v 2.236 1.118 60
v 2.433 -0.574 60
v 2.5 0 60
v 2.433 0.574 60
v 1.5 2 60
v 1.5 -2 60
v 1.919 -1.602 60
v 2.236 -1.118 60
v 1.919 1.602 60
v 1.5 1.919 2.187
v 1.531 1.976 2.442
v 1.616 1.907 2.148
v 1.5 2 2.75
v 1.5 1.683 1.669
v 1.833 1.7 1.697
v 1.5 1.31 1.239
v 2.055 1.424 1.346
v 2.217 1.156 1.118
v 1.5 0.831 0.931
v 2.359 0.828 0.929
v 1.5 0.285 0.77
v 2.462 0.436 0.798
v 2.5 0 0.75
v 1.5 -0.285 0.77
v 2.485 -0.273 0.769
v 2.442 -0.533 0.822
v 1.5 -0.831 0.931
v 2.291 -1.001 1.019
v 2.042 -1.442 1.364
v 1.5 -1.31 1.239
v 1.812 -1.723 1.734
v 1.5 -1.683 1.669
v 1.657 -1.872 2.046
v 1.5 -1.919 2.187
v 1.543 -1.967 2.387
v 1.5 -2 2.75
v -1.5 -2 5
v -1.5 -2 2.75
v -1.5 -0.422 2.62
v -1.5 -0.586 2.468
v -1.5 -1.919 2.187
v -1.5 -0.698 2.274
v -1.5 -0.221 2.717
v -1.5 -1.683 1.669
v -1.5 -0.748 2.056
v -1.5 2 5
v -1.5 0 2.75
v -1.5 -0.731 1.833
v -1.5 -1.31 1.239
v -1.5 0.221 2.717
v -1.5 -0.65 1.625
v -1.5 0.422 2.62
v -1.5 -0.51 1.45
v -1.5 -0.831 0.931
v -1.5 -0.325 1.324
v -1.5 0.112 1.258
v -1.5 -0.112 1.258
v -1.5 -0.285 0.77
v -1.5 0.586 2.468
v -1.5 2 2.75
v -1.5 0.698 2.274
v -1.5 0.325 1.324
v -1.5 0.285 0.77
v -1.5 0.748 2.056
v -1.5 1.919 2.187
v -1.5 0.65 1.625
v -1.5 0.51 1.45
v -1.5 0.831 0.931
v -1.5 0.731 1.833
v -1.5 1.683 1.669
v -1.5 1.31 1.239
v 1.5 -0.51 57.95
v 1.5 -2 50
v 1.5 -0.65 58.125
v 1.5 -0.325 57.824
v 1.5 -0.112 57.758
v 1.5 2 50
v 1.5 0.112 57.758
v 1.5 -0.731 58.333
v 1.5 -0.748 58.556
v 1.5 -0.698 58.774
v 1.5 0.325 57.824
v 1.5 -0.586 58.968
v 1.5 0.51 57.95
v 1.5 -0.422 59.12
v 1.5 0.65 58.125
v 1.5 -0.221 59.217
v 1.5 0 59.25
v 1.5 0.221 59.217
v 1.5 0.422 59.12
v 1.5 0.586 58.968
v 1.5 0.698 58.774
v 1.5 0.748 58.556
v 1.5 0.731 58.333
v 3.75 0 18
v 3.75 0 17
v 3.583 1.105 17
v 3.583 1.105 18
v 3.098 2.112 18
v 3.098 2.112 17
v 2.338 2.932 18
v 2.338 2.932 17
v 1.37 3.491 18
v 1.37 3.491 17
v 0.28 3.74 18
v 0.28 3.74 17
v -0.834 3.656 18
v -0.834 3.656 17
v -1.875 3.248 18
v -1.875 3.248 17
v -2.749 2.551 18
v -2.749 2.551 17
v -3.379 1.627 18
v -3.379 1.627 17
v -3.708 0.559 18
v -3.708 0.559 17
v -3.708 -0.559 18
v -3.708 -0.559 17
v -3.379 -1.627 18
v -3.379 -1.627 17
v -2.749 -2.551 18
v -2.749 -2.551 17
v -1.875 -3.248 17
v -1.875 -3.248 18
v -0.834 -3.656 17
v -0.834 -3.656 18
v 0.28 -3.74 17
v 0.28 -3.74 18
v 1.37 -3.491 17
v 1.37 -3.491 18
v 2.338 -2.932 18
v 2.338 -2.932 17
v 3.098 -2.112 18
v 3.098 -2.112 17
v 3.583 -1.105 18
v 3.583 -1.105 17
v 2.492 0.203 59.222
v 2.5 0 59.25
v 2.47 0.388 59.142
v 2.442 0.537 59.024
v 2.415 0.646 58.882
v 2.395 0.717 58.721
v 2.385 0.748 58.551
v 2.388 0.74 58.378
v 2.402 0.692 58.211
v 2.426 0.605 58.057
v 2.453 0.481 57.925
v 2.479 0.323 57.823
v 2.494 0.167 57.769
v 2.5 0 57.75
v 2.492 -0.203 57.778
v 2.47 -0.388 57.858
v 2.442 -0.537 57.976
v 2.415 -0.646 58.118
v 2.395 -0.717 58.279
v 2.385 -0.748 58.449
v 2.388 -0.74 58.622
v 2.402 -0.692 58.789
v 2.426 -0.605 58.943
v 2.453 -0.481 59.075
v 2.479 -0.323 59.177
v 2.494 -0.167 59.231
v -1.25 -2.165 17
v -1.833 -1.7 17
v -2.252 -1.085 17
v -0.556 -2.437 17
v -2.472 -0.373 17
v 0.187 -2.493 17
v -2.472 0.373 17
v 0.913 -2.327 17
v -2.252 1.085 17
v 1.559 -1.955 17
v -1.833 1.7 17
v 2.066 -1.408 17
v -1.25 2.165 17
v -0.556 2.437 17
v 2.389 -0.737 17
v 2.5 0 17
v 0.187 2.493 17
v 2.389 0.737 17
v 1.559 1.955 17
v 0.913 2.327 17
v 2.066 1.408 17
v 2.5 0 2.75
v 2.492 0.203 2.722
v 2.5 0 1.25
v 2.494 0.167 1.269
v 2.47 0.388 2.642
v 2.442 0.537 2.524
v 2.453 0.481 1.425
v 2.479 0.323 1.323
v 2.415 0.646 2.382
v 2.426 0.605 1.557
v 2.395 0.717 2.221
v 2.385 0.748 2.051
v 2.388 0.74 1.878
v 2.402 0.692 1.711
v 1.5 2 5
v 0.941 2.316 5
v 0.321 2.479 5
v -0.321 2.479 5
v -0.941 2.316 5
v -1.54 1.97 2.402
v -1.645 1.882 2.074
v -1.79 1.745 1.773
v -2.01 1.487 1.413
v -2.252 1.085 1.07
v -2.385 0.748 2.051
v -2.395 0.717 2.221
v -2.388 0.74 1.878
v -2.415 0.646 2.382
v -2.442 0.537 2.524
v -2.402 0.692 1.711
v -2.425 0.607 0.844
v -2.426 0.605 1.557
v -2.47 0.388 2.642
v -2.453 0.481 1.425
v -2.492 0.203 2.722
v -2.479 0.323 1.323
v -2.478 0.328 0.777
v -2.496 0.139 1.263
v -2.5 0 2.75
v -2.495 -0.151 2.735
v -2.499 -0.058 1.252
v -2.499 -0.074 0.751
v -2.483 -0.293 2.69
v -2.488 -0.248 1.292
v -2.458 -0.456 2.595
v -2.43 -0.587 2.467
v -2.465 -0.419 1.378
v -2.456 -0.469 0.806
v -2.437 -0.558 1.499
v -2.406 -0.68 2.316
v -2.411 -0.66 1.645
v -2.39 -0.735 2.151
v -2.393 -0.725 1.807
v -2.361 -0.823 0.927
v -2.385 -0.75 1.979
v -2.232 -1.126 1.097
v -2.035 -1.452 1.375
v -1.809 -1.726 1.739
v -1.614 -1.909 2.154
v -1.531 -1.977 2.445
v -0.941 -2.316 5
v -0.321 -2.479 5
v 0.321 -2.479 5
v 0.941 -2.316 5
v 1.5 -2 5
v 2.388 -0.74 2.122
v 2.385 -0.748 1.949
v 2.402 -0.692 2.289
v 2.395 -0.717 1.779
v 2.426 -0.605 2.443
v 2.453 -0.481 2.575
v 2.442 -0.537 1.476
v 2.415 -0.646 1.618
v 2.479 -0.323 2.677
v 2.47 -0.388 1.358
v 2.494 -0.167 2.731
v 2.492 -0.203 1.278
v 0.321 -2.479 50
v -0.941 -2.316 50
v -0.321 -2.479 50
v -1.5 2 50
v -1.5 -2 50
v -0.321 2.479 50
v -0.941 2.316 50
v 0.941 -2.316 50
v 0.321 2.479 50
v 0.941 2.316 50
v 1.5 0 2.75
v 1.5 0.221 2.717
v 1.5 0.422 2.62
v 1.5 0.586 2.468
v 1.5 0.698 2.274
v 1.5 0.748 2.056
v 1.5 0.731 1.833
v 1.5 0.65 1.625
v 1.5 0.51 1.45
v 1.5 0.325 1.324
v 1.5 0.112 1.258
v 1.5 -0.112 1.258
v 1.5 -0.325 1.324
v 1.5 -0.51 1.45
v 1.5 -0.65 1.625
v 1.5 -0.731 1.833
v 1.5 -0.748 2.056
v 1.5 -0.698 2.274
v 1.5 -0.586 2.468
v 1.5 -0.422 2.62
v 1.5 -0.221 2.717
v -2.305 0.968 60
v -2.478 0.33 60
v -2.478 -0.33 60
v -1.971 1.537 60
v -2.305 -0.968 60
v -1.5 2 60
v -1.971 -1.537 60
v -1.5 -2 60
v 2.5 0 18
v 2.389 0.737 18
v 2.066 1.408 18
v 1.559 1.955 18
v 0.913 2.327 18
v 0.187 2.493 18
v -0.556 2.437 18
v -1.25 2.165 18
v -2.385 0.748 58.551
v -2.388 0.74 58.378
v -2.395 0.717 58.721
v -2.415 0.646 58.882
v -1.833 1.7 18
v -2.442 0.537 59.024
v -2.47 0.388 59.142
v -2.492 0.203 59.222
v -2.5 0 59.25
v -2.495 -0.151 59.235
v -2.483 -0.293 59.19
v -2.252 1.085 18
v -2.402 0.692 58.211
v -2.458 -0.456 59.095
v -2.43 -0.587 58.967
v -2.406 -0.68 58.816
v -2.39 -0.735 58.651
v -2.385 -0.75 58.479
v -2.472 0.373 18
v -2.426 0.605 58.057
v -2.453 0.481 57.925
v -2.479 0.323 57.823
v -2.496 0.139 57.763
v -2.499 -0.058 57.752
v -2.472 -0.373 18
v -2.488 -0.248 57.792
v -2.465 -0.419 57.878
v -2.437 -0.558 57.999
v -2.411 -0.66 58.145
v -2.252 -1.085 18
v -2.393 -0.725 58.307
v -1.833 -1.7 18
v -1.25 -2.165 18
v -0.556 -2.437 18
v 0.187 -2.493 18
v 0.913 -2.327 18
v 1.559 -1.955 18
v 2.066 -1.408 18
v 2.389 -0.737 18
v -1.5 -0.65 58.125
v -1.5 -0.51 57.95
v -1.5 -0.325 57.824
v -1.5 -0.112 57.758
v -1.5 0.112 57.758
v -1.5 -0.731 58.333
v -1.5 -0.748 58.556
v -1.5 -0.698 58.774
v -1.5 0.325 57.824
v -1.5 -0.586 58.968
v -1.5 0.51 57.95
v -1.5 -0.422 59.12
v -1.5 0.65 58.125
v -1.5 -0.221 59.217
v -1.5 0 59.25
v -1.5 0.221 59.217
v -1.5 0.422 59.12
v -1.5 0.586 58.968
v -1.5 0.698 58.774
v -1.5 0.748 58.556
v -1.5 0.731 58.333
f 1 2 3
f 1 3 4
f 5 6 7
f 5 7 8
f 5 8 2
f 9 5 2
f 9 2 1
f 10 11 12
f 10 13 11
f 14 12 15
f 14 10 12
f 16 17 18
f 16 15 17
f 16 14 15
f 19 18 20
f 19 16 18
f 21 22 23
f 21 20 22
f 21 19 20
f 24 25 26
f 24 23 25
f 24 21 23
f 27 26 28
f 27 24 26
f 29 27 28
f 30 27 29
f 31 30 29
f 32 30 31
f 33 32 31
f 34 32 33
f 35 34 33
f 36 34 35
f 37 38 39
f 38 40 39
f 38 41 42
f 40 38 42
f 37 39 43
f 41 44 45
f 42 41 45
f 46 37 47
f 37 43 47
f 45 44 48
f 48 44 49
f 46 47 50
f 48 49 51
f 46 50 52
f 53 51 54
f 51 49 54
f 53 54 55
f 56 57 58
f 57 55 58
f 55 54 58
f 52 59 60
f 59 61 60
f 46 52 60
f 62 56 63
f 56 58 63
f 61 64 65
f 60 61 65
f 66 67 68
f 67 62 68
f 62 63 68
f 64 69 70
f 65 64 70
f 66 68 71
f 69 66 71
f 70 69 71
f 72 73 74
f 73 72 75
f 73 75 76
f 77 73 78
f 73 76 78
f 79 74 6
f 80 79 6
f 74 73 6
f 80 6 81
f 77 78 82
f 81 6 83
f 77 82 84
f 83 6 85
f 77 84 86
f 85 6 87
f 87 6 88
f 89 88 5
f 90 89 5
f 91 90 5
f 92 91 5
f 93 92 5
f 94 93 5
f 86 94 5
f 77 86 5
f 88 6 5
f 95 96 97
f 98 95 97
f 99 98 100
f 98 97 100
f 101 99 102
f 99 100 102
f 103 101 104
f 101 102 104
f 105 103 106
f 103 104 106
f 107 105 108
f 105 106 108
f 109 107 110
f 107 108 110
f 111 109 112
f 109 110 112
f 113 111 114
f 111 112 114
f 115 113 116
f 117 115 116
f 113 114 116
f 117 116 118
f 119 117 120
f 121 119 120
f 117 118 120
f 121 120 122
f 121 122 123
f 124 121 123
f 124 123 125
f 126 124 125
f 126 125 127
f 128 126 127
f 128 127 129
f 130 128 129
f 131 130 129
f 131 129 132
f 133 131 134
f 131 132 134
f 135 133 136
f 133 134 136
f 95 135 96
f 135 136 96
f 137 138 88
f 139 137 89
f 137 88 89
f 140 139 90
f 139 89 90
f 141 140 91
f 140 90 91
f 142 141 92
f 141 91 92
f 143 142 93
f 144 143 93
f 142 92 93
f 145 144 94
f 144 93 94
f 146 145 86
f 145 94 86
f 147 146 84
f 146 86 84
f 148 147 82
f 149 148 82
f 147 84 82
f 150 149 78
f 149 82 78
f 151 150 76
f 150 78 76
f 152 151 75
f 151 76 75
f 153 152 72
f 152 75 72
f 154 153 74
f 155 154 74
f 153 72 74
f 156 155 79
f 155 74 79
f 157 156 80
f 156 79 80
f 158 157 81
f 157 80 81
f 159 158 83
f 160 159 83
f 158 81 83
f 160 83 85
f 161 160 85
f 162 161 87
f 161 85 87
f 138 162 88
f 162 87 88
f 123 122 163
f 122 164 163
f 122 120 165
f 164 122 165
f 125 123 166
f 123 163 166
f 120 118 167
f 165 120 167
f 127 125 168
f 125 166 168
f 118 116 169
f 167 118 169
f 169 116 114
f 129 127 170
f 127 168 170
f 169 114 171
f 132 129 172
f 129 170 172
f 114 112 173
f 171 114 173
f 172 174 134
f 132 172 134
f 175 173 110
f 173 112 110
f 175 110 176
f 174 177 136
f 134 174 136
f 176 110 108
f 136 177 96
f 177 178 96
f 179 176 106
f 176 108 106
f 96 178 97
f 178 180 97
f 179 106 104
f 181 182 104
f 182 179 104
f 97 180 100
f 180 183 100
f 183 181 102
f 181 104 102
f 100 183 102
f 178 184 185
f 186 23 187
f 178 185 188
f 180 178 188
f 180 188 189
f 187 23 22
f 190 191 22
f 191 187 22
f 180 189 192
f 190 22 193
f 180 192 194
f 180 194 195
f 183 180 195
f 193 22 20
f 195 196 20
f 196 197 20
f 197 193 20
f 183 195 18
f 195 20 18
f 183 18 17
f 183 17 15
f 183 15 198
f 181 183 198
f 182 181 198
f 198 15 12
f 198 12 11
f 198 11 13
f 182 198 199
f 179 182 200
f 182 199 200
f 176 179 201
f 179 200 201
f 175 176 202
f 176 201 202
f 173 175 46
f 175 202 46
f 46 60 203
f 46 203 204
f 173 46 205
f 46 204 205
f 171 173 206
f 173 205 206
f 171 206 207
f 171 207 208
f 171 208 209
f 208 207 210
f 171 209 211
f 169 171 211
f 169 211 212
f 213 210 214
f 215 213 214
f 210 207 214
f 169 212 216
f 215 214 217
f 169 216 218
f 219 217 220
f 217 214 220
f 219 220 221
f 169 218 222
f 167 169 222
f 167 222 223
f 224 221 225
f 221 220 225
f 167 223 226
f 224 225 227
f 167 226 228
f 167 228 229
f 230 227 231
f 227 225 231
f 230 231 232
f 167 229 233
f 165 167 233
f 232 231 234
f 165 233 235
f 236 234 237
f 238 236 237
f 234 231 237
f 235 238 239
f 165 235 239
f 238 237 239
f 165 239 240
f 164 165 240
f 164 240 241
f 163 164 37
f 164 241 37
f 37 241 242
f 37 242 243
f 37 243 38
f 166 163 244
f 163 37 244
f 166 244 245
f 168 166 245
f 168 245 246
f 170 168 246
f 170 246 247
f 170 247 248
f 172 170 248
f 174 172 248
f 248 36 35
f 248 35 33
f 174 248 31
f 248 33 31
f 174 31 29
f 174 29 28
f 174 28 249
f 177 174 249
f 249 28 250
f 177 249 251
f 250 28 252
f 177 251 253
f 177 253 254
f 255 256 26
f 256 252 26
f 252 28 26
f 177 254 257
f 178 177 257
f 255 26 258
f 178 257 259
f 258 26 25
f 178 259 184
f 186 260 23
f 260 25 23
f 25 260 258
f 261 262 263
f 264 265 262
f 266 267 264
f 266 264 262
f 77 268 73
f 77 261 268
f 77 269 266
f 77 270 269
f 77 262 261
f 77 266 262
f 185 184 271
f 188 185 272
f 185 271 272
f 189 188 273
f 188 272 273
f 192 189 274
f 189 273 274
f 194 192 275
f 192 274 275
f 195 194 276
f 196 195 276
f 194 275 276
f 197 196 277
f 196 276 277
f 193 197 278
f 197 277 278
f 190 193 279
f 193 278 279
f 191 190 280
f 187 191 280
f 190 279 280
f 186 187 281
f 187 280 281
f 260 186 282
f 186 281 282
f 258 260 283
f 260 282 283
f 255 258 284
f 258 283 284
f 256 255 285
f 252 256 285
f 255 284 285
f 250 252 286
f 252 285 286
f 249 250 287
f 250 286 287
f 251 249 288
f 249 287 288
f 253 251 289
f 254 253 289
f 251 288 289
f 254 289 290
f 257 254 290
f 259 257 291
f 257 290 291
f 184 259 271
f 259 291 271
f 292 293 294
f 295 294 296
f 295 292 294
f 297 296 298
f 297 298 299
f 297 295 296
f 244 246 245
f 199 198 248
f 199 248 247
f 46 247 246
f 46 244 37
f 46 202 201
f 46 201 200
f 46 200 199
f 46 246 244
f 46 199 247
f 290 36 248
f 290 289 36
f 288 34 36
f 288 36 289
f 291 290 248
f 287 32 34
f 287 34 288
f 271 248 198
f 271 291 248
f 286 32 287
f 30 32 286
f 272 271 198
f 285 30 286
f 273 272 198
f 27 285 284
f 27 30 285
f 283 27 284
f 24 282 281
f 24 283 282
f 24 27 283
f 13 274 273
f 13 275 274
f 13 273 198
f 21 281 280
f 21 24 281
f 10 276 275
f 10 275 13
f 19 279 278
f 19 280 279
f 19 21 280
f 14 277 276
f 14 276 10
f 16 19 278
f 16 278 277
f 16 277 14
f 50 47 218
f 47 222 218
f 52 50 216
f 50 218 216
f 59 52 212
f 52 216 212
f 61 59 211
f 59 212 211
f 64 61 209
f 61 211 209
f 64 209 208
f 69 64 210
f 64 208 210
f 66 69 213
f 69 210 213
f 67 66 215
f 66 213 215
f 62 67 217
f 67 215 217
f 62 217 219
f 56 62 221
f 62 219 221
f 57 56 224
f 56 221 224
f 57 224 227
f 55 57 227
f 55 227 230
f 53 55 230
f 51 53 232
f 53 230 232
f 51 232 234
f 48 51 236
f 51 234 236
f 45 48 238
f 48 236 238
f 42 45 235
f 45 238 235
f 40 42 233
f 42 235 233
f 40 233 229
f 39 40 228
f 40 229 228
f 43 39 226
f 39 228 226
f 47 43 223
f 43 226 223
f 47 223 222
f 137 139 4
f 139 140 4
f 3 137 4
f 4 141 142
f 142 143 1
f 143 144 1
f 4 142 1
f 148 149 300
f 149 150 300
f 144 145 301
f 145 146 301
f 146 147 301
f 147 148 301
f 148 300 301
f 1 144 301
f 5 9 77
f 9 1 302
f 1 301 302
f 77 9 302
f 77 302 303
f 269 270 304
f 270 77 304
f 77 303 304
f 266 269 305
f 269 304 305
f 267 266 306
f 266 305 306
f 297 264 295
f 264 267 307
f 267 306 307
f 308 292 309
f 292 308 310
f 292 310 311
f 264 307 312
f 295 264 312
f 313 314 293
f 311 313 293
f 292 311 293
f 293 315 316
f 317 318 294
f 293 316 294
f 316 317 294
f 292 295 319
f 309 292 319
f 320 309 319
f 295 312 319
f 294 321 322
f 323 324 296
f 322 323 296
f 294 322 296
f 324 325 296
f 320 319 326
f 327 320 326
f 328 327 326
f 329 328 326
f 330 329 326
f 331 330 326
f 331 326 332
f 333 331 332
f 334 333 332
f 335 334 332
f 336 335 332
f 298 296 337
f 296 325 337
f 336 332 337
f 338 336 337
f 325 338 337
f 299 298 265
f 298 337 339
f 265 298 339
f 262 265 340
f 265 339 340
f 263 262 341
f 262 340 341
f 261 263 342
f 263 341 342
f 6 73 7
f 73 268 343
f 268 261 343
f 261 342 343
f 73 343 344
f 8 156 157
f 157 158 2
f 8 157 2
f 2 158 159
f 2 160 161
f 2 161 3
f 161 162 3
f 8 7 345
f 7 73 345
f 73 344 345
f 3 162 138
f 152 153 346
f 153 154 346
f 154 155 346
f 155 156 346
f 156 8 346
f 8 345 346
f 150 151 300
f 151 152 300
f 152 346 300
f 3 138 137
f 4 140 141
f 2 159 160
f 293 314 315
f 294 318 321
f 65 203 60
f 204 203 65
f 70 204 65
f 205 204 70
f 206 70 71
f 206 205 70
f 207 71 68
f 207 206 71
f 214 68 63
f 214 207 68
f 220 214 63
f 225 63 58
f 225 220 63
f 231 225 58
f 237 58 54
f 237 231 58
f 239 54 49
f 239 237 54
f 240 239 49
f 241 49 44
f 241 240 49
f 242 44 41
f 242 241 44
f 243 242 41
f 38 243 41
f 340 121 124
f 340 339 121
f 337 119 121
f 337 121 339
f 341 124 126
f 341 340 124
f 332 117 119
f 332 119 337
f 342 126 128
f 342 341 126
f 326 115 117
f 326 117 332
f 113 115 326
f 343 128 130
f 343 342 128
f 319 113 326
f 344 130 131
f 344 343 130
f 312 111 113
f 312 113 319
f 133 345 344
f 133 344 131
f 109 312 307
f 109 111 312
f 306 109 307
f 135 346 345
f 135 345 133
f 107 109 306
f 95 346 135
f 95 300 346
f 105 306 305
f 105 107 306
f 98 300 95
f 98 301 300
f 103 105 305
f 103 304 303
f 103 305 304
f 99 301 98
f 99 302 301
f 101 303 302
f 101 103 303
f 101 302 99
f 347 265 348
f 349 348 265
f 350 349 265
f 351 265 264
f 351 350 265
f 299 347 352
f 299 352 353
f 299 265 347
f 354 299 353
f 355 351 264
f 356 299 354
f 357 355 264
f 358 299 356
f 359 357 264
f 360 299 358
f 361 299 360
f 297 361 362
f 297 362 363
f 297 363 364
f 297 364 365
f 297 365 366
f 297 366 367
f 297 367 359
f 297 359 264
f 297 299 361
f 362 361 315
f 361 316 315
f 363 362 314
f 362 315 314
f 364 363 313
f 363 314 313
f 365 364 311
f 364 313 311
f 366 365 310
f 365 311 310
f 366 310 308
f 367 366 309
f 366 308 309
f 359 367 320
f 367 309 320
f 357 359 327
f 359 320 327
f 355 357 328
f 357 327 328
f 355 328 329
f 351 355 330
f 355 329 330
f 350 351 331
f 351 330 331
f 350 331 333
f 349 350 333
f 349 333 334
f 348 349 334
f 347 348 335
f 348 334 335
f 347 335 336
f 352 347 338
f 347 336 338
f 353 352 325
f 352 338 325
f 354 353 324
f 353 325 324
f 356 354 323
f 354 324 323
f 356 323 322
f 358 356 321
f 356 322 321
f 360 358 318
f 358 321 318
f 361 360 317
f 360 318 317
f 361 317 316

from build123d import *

# Parameters (mm, degrees)
CROQUIS1_R              = 2.5
SALIENTE_EXTRUIR1_DEPTH = 60
SALIENTE_EXTRUIR2_START = -1
CROQUIS2_R              = 3.75
CROQUIS2_R_2            = 2.5
SALIENTE_EXTRUIR2_DEPTH = 1
CROQUIS5_W              = 3
CROQUIS5_H              = 5.669520972
CORTAR_EXTRUIR1_DEPTH   = 10
CROQUIS6_R              = 0.75
CORTAR_EXTRUIR2_DEPTH   = 4.5
CROQUIS7_W              = 3
CROQUIS7_H              = 6.567565146
CORTAR_EXTRUIR3_DEPTH   = 5
CROQUIS8_R              = 0.75
CORTAR_EXTRUIR4_DEPTH   = 5
CORTAR_EXTRUIR5_DEPTH   = 5


with BuildPart() as part:
    # Croquis1 → Saliente-Extruir1 (new body)
    with BuildSketch(Plane.XY):
        Circle(CROQUIS1_R)
    extrude(amount=SALIENTE_EXTRUIR1_DEPTH)

    # Croquis2 → Saliente-Extruir2 (add)
    with BuildSketch(Plane.XY.offset(18).offset(SALIENTE_EXTRUIR2_START)):
        Circle(CROQUIS2_R)
        Circle(CROQUIS2_R_2, mode=Mode.SUBTRACT)
    extrude(amount=SALIENTE_EXTRUIR2_DEPTH)

    # Croquis5 → Cortar-Extruir1 (cut, symmetric)
    with BuildSketch(Plane.XY.offset(60)):
        Rectangle(CROQUIS5_W, CROQUIS5_H)
    extrude(amount=CORTAR_EXTRUIR1_DEPTH, both=True, mode=Mode.SUBTRACT)

    # Croquis6 → Cortar-Extruir2 (cut, symmetric)
    with BuildSketch(Plane.ZY.offset(-1.5)):
        with Locations((58.5, 0)):
            Circle(CROQUIS6_R)
    extrude(amount=CORTAR_EXTRUIR2_DEPTH, both=True, mode=Mode.SUBTRACT)

    # Croquis7 → Cortar-Extruir3 (cut)
    with BuildSketch(Plane(origin=(0, 0, 0), x_dir=(-1, 0, 0), z_dir=(0, 0, -1))):
        Rectangle(CROQUIS7_W, CROQUIS7_H)
    extrude(amount=-CORTAR_EXTRUIR3_DEPTH, mode=Mode.SUBTRACT)

    # Croquis8 → Cortar-Extruir4 (cut, symmetric)
    with BuildSketch(Plane.ZY.offset(-1.5)):
        with Locations((2, 0)):
            Circle(CROQUIS8_R)
    extrude(amount=CORTAR_EXTRUIR4_DEPTH, both=True, mode=Mode.SUBTRACT)

    # Croquis9 → Cortar-Extruir5 (cut, symmetric)
    with BuildSketch(Plane.ZY.offset(-1.5)):
        with BuildLine():
            Line((0, 2), (2.75, 2))
            ThreePointArc((2.75, 2), (0.75, 0), (2.75, -2))
            Line((2.75, -2), (0, -2))
            Line((0, -2), (0, 2))
        make_face()
    extrude(amount=CORTAR_EXTRUIR5_DEPTH, both=True, mode=Mode.SUBTRACT)


solid = part.part
